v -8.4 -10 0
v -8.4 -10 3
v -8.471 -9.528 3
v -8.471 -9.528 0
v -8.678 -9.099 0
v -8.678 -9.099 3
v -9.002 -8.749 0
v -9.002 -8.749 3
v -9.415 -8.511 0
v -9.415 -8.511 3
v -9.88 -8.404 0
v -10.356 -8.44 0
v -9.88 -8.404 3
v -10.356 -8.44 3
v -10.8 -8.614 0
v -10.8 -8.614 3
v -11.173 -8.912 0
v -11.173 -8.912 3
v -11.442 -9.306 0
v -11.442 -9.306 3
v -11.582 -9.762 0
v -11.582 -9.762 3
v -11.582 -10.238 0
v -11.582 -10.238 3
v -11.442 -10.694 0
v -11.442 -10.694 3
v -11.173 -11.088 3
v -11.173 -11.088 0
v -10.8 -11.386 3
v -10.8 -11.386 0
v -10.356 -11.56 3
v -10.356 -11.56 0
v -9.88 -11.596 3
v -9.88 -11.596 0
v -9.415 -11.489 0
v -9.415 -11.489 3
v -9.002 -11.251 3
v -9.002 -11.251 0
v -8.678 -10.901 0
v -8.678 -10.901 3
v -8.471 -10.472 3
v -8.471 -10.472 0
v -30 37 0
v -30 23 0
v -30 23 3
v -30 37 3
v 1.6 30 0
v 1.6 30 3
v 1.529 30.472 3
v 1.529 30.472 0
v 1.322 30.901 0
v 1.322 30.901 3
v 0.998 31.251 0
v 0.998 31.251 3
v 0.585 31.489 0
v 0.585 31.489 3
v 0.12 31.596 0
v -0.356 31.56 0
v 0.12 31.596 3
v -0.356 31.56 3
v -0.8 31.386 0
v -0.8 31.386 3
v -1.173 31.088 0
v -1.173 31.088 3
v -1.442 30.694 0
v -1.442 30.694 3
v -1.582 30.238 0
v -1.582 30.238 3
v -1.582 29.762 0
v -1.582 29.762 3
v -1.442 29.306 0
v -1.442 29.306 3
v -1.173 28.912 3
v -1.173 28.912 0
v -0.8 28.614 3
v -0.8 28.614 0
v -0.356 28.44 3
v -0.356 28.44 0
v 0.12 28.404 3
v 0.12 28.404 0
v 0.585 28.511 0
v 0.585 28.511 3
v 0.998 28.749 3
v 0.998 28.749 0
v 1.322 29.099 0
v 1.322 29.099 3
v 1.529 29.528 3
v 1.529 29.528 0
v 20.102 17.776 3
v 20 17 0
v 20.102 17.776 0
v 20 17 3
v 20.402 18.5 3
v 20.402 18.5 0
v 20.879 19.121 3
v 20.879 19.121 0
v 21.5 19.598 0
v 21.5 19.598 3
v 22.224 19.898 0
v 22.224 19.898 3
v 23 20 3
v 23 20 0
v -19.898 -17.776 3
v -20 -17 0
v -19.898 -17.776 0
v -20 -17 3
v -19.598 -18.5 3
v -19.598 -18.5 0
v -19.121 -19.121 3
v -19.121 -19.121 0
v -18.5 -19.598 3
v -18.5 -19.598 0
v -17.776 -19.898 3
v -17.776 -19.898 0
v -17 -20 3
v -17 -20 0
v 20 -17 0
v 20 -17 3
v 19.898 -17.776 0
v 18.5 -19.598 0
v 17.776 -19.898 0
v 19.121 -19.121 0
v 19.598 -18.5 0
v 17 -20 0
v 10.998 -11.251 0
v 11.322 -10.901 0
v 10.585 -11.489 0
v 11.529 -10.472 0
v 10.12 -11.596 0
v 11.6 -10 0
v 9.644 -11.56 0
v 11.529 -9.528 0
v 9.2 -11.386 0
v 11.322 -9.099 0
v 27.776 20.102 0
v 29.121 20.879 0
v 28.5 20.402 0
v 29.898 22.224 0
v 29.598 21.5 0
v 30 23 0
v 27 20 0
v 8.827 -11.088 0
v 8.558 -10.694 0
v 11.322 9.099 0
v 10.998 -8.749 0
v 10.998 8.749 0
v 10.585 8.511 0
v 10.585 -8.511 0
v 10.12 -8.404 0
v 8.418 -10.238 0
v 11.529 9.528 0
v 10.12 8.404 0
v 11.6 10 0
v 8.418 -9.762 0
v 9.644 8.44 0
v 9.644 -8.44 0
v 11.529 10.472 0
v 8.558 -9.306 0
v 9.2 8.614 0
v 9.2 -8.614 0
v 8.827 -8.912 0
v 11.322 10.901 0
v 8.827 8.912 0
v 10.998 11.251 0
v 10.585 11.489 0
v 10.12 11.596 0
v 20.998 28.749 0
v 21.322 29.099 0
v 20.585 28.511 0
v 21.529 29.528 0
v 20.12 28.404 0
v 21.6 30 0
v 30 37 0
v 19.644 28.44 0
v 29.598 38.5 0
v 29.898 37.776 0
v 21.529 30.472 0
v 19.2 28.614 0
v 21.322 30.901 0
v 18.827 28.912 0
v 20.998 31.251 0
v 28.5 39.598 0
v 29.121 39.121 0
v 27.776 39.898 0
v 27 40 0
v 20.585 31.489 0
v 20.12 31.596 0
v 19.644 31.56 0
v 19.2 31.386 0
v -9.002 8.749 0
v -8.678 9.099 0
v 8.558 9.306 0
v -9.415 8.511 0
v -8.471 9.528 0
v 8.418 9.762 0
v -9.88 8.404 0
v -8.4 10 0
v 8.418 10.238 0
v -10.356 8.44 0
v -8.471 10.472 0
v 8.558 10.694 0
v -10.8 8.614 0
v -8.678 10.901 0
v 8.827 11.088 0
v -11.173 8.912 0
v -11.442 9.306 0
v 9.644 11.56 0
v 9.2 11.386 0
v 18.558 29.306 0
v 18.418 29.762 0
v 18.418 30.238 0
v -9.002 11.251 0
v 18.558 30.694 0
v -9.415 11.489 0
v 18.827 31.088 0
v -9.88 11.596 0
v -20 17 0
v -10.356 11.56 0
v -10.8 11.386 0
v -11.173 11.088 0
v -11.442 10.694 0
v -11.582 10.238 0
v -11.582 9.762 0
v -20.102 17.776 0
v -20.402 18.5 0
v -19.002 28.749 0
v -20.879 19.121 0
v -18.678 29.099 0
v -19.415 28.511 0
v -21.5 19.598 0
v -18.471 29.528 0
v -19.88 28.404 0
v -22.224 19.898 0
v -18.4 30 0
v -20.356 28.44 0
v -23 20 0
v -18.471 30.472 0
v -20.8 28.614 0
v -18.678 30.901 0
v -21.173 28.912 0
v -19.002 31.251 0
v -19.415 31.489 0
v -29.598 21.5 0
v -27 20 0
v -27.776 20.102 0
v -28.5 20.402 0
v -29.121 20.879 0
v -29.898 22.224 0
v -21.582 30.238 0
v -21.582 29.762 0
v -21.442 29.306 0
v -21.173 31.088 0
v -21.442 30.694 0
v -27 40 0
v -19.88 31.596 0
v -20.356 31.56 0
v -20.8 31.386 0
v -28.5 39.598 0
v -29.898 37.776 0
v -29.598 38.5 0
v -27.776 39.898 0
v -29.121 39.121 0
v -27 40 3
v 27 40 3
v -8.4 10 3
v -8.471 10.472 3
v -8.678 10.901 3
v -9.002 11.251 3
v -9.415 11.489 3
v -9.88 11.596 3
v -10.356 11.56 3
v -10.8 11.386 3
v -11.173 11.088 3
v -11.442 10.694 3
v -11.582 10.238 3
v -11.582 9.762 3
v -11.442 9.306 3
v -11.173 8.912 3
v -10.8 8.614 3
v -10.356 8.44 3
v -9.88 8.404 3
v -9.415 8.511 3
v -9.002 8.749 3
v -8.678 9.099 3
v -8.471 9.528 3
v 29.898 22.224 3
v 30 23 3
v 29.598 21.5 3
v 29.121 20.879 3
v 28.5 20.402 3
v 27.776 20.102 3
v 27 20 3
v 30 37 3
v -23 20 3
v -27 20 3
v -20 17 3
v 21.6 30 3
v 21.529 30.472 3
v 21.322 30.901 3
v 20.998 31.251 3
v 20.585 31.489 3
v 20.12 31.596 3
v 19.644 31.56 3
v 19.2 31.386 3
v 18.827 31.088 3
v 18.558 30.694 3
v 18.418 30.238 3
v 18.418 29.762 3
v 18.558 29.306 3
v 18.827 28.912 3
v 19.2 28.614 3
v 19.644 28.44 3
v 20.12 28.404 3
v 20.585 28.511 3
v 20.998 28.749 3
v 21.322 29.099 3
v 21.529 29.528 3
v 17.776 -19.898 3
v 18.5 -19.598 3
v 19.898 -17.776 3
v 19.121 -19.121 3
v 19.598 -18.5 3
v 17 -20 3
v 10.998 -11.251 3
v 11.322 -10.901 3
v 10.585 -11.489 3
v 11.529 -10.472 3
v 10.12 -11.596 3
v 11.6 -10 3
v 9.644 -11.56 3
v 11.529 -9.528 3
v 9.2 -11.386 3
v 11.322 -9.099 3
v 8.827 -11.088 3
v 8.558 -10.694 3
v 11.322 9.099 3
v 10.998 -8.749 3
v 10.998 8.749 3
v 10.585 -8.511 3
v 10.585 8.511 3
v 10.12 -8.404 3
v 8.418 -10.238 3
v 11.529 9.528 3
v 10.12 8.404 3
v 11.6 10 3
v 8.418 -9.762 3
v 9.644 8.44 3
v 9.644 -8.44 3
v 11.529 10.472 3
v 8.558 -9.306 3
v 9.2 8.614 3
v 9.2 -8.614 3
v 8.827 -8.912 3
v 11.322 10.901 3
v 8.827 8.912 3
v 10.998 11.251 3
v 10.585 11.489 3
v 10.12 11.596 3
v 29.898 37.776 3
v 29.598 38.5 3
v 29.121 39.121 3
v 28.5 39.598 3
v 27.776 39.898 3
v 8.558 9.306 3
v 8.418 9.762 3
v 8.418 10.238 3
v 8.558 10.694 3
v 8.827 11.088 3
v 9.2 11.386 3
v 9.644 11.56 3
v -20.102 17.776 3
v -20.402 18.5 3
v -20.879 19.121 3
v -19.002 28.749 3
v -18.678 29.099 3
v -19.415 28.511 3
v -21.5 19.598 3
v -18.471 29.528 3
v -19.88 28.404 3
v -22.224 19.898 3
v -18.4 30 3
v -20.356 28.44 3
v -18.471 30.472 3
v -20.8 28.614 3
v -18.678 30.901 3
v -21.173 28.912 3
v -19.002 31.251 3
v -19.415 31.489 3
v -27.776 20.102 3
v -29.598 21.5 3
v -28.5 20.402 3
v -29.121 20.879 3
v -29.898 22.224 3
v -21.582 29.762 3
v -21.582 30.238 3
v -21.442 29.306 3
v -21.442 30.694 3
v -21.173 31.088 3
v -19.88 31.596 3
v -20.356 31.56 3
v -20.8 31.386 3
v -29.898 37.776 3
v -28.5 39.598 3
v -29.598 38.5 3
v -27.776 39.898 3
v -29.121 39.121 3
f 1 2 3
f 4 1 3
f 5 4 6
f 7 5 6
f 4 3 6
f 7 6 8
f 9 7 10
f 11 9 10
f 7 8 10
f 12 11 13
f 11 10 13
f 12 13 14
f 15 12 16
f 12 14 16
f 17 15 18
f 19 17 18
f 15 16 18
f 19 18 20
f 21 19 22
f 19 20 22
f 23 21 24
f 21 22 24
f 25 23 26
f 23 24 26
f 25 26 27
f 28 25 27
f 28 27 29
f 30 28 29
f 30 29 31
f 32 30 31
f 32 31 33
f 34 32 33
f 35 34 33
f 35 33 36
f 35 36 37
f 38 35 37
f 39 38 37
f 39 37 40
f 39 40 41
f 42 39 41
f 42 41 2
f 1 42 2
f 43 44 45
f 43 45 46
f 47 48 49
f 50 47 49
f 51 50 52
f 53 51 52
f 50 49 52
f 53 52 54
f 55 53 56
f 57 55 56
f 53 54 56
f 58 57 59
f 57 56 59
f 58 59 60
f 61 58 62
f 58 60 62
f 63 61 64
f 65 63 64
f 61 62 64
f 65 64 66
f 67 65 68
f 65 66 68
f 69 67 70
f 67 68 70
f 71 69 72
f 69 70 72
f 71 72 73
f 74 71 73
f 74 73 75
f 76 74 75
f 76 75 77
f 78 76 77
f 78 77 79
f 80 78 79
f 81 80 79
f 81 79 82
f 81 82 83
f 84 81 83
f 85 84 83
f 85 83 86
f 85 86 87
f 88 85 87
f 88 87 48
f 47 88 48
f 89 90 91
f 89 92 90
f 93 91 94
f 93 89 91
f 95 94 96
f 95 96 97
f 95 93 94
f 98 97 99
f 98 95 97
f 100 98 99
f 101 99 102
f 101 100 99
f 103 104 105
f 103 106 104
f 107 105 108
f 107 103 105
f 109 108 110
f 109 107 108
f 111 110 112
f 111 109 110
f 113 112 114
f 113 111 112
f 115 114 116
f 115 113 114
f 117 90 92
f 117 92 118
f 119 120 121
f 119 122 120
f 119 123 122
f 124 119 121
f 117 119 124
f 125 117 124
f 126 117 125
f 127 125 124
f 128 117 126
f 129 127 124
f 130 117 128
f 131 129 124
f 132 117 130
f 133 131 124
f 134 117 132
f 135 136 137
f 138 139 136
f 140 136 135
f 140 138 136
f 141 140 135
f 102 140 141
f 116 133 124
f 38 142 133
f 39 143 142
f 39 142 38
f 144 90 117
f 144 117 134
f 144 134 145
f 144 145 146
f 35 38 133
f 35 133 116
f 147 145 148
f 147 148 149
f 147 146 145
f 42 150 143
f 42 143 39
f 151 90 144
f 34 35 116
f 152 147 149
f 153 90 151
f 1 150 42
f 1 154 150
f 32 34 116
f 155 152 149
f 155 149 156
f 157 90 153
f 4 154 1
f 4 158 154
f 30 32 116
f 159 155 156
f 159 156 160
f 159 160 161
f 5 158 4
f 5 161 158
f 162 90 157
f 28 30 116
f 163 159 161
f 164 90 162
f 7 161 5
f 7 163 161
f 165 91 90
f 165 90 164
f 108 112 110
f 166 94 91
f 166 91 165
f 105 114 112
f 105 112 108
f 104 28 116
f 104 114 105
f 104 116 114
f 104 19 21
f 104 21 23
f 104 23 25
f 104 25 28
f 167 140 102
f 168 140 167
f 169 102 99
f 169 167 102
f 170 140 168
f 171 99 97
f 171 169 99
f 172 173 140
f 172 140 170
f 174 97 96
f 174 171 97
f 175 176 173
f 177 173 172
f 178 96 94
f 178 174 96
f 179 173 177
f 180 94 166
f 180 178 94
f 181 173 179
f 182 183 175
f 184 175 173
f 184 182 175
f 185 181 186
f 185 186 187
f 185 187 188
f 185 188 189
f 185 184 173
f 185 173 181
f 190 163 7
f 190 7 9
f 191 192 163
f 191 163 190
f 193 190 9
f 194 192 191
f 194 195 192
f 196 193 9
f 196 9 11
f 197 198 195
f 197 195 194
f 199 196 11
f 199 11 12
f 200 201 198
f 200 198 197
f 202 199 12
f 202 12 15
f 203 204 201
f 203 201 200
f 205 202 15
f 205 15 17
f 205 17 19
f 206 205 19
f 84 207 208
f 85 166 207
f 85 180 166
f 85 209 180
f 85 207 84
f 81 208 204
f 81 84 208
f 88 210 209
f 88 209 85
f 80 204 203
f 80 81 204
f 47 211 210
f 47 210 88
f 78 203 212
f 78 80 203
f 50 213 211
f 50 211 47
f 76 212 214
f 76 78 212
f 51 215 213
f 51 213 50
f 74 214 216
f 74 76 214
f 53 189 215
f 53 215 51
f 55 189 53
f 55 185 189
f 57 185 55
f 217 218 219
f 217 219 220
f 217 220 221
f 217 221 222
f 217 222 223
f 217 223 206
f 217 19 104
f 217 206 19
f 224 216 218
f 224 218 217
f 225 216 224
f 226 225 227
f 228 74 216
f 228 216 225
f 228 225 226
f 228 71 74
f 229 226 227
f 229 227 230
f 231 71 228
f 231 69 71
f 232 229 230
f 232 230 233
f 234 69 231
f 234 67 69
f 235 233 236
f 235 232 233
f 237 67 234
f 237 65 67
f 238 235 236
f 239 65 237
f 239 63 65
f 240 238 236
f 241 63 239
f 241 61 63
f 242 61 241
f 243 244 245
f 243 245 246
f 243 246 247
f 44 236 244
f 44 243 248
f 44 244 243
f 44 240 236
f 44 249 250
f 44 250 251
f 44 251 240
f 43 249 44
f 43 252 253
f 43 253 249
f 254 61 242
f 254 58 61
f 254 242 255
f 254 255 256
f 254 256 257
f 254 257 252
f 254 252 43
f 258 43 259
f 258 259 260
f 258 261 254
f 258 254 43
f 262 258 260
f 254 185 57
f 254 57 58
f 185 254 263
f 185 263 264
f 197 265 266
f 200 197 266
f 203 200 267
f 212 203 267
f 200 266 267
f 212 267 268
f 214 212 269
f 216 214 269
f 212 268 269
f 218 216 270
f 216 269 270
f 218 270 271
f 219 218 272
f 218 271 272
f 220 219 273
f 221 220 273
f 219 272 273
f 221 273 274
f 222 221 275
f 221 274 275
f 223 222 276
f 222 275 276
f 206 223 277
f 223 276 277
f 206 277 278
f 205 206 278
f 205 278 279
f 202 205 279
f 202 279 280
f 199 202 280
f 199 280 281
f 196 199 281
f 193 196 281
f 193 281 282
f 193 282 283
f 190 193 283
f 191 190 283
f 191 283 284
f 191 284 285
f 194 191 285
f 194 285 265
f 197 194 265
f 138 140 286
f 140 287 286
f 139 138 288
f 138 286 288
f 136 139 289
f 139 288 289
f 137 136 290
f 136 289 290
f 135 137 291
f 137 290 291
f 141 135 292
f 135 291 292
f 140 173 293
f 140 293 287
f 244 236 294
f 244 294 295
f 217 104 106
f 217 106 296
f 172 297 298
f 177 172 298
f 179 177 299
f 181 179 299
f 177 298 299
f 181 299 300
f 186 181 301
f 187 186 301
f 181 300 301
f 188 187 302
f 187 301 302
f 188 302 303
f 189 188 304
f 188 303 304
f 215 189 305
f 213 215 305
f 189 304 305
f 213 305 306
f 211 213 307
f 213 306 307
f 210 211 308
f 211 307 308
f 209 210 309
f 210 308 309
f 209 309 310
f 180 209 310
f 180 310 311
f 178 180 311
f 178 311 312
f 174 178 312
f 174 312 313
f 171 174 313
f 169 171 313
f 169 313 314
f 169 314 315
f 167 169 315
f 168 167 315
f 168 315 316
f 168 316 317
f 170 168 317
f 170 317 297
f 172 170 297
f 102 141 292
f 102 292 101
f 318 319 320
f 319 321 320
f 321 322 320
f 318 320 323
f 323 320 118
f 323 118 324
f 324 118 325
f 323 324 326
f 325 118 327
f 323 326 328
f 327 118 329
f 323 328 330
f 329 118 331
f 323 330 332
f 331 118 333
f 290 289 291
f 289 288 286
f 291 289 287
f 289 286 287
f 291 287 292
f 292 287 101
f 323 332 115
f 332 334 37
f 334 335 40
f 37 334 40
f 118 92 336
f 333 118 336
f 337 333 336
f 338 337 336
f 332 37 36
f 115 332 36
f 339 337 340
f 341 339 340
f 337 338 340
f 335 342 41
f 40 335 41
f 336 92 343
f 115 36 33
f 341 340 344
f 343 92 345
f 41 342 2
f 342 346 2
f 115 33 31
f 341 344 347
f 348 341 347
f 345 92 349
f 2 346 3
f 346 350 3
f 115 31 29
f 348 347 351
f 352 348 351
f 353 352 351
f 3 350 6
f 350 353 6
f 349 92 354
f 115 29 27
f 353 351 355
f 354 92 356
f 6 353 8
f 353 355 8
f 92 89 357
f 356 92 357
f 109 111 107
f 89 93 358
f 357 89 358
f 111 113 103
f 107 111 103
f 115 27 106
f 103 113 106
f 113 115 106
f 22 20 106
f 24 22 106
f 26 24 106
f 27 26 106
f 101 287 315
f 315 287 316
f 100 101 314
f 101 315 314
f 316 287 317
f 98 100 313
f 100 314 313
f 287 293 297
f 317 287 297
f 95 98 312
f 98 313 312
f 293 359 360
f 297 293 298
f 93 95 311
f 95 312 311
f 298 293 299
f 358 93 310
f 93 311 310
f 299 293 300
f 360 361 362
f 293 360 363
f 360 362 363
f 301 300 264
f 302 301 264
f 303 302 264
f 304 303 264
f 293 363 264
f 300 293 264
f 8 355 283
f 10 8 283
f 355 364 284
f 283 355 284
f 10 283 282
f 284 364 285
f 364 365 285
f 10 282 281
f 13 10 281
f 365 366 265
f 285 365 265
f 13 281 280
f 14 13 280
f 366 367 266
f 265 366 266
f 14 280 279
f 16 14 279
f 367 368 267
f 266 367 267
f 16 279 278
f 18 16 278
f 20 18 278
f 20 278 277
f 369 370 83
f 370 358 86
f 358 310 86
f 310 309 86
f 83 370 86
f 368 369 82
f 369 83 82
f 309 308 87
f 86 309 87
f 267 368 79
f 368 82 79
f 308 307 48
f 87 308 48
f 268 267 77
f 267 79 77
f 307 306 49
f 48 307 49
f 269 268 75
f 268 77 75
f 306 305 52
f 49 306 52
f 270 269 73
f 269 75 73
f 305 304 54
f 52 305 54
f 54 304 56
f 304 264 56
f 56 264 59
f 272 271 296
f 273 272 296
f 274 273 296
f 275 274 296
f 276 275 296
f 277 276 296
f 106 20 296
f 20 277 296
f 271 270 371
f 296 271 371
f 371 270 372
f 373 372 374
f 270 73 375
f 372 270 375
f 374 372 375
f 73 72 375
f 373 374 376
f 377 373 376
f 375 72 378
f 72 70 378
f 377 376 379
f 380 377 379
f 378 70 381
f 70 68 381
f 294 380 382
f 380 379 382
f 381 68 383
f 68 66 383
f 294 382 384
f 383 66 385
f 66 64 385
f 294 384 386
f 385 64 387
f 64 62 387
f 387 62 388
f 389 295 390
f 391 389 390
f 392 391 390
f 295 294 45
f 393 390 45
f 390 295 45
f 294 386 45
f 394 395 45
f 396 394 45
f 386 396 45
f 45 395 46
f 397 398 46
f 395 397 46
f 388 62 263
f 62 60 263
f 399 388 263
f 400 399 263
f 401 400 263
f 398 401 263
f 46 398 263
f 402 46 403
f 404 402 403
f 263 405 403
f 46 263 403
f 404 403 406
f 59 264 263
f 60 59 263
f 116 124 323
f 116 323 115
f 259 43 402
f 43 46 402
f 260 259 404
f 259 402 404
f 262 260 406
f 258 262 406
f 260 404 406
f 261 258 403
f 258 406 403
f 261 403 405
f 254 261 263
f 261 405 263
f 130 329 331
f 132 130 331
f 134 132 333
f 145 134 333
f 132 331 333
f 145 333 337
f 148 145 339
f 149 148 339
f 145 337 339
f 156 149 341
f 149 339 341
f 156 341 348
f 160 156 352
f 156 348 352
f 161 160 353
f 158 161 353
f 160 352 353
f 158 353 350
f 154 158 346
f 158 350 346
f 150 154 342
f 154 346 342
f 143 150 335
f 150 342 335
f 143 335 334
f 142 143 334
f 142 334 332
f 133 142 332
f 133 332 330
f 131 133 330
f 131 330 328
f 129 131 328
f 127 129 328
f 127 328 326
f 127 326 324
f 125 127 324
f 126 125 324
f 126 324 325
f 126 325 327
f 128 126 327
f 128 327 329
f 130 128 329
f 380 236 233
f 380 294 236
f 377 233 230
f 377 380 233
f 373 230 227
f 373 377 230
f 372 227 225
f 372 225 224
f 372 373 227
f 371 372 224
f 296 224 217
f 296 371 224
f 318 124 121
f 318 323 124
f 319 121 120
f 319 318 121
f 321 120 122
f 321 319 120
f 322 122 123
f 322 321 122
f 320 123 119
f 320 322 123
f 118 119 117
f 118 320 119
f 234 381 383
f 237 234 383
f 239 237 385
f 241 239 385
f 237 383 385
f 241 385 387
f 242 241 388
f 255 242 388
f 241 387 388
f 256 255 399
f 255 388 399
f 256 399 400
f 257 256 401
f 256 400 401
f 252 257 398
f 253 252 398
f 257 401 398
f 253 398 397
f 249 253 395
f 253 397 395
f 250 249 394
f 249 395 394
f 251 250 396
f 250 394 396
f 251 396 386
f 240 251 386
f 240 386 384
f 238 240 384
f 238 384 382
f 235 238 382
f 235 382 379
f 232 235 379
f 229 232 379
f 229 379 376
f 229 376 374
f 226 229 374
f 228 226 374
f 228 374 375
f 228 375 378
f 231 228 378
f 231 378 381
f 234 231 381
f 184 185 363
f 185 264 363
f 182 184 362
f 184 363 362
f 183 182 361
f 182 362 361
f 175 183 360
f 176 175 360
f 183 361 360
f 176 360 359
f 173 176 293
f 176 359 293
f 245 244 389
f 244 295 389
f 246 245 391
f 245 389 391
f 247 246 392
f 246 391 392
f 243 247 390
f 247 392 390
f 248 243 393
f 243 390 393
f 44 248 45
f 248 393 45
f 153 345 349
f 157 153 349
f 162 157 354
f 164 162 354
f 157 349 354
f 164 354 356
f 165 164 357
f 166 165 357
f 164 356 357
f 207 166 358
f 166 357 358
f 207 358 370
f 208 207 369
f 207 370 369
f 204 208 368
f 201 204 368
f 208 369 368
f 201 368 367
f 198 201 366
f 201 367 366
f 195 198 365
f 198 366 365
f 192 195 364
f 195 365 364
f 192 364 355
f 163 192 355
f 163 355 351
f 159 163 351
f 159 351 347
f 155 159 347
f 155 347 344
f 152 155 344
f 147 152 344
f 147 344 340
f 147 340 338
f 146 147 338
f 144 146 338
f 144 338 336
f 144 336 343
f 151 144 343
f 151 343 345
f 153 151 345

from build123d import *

# Parameters (mm, degrees)
EXTRUDE_1_DEPTH     = 3
CUT_EXTRUDE_1_REACH = 52.09
SKETCH_2_R          = 1.6
FILLET_1_R          = 3
FILLET_2_R          = 3


with BuildPart() as part:
    # 草图1 → 凸台-拉伸1 (new body)
    with BuildSketch(Plane.XY):
        Polygon((-20, 20), (-30, 20), (-30, 40), (30, 40), (30, 20), (20, 20), (20, -20), (-20, -20), align=None)
    extrude(amount=EXTRUDE_1_DEPTH)

    # 草图2 → 切除-拉伸1 (cut, up to next)
    with BuildSketch(Plane.XY.offset(3), mode=Mode.PRIVATE) as cut_extrude_1_sk1:
        with Locations((-20, 30)):
            Circle(SKETCH_2_R)
    cut_extrude_1_tool1 = extrude(cut_extrude_1_sk1.sketch, amount=-CUT_EXTRUDE_1_REACH, mode=Mode.PRIVATE) & part.part
    # 草图2 → 切除-拉伸1 (cut, up to next)
    with BuildSketch(Plane.XY.offset(3), mode=Mode.PRIVATE) as cut_extrude_1_sk2:
        with Locations((0, 30)):
            Circle(SKETCH_2_R)
    cut_extrude_1_tool2 = extrude(cut_extrude_1_sk2.sketch, amount=-CUT_EXTRUDE_1_REACH, mode=Mode.PRIVATE) & part.part
    # 草图2 → 切除-拉伸1 (cut, up to next)
    with BuildSketch(Plane.XY.offset(3), mode=Mode.PRIVATE) as cut_extrude_1_sk3:
        with Locations((20, 30)):
            Circle(SKETCH_2_R)
    cut_extrude_1_tool3 = extrude(cut_extrude_1_sk3.sketch, amount=-CUT_EXTRUDE_1_REACH, mode=Mode.PRIVATE) & part.part
    # 草图2 → 切除-拉伸1 (cut, up to next)
    with BuildSketch(Plane.XY.offset(3), mode=Mode.PRIVATE) as cut_extrude_1_sk4:
        with Locations((-10, -10)):
            Circle(SKETCH_2_R)
    cut_extrude_1_tool4 = extrude(cut_extrude_1_sk4.sketch, amount=-CUT_EXTRUDE_1_REACH, mode=Mode.PRIVATE) & part.part
    # 草图2 → 切除-拉伸1 (cut, up to next)
    with BuildSketch(Plane.XY.offset(3), mode=Mode.PRIVATE) as cut_extrude_1_sk5:
        with Locations((10, -10)):
            Circle(SKETCH_2_R)
    cut_extrude_1_tool5 = extrude(cut_extrude_1_sk5.sketch, amount=-CUT_EXTRUDE_1_REACH, mode=Mode.PRIVATE) & part.part
    # 草图2 → 切除-拉伸1 (cut, up to next)
    with BuildSketch(Plane.XY.offset(3), mode=Mode.PRIVATE) as cut_extrude_1_sk6:
        with Locations((10, 10)):
            Circle(SKETCH_2_R)
    cut_extrude_1_tool6 = extrude(cut_extrude_1_sk6.sketch, amount=-CUT_EXTRUDE_1_REACH, mode=Mode.PRIVATE) & part.part
    # 草图2 → 切除-拉伸1 (cut, up to next)
    with BuildSketch(Plane.XY.offset(3), mode=Mode.PRIVATE) as cut_extrude_1_sk7:
        with Locations((-10, 10)):
            Circle(SKETCH_2_R)
    cut_extrude_1_tool7 = extrude(cut_extrude_1_sk7.sketch, amount=-CUT_EXTRUDE_1_REACH, mode=Mode.PRIVATE) & part.part
    add(cut_extrude_1_tool1.solids().sort_by_distance((-20, 30, 3))[0], mode=Mode.SUBTRACT)
    add(cut_extrude_1_tool2.solids().sort_by_distance((0, 30, 3))[0], mode=Mode.SUBTRACT)
    add(cut_extrude_1_tool3.solids().sort_by_distance((20, 30, 3))[0], mode=Mode.SUBTRACT)
    add(cut_extrude_1_tool4.solids().sort_by_distance((-10, -10, 3))[0], mode=Mode.SUBTRACT)
    add(cut_extrude_1_tool5.solids().sort_by_distance((10, -10, 3))[0], mode=Mode.SUBTRACT)
    add(cut_extrude_1_tool6.solids().sort_by_distance((10, 10, 3))[0], mode=Mode.SUBTRACT)
    add(cut_extrude_1_tool7.solids().sort_by_distance((-10, 10, 3))[0], mode=Mode.SUBTRACT)

    # 圆角1
    fillet_1_edges = [part.edges().sort_by_distance(p)[0] for p in [
        (20, -20, 1.5),
        (-20, -20, 1.5),
        (-30, 20, 1.5),
        (-30, 40, 1.5),
        (30, 40, 1.5),
        (30, 20, 1.5),
    ]]
    fillet(fillet_1_edges, radius=FILLET_1_R)

    # 圆角2
    fillet_2_edges = [part.edges().sort_by_distance(p)[0] for p in [
        (-20, 20, 1.5),
        (20, 20, 1.5),
    ]]
    fillet(fillet_2_edges, radius=FILLET_2_R)


solid = part.part
